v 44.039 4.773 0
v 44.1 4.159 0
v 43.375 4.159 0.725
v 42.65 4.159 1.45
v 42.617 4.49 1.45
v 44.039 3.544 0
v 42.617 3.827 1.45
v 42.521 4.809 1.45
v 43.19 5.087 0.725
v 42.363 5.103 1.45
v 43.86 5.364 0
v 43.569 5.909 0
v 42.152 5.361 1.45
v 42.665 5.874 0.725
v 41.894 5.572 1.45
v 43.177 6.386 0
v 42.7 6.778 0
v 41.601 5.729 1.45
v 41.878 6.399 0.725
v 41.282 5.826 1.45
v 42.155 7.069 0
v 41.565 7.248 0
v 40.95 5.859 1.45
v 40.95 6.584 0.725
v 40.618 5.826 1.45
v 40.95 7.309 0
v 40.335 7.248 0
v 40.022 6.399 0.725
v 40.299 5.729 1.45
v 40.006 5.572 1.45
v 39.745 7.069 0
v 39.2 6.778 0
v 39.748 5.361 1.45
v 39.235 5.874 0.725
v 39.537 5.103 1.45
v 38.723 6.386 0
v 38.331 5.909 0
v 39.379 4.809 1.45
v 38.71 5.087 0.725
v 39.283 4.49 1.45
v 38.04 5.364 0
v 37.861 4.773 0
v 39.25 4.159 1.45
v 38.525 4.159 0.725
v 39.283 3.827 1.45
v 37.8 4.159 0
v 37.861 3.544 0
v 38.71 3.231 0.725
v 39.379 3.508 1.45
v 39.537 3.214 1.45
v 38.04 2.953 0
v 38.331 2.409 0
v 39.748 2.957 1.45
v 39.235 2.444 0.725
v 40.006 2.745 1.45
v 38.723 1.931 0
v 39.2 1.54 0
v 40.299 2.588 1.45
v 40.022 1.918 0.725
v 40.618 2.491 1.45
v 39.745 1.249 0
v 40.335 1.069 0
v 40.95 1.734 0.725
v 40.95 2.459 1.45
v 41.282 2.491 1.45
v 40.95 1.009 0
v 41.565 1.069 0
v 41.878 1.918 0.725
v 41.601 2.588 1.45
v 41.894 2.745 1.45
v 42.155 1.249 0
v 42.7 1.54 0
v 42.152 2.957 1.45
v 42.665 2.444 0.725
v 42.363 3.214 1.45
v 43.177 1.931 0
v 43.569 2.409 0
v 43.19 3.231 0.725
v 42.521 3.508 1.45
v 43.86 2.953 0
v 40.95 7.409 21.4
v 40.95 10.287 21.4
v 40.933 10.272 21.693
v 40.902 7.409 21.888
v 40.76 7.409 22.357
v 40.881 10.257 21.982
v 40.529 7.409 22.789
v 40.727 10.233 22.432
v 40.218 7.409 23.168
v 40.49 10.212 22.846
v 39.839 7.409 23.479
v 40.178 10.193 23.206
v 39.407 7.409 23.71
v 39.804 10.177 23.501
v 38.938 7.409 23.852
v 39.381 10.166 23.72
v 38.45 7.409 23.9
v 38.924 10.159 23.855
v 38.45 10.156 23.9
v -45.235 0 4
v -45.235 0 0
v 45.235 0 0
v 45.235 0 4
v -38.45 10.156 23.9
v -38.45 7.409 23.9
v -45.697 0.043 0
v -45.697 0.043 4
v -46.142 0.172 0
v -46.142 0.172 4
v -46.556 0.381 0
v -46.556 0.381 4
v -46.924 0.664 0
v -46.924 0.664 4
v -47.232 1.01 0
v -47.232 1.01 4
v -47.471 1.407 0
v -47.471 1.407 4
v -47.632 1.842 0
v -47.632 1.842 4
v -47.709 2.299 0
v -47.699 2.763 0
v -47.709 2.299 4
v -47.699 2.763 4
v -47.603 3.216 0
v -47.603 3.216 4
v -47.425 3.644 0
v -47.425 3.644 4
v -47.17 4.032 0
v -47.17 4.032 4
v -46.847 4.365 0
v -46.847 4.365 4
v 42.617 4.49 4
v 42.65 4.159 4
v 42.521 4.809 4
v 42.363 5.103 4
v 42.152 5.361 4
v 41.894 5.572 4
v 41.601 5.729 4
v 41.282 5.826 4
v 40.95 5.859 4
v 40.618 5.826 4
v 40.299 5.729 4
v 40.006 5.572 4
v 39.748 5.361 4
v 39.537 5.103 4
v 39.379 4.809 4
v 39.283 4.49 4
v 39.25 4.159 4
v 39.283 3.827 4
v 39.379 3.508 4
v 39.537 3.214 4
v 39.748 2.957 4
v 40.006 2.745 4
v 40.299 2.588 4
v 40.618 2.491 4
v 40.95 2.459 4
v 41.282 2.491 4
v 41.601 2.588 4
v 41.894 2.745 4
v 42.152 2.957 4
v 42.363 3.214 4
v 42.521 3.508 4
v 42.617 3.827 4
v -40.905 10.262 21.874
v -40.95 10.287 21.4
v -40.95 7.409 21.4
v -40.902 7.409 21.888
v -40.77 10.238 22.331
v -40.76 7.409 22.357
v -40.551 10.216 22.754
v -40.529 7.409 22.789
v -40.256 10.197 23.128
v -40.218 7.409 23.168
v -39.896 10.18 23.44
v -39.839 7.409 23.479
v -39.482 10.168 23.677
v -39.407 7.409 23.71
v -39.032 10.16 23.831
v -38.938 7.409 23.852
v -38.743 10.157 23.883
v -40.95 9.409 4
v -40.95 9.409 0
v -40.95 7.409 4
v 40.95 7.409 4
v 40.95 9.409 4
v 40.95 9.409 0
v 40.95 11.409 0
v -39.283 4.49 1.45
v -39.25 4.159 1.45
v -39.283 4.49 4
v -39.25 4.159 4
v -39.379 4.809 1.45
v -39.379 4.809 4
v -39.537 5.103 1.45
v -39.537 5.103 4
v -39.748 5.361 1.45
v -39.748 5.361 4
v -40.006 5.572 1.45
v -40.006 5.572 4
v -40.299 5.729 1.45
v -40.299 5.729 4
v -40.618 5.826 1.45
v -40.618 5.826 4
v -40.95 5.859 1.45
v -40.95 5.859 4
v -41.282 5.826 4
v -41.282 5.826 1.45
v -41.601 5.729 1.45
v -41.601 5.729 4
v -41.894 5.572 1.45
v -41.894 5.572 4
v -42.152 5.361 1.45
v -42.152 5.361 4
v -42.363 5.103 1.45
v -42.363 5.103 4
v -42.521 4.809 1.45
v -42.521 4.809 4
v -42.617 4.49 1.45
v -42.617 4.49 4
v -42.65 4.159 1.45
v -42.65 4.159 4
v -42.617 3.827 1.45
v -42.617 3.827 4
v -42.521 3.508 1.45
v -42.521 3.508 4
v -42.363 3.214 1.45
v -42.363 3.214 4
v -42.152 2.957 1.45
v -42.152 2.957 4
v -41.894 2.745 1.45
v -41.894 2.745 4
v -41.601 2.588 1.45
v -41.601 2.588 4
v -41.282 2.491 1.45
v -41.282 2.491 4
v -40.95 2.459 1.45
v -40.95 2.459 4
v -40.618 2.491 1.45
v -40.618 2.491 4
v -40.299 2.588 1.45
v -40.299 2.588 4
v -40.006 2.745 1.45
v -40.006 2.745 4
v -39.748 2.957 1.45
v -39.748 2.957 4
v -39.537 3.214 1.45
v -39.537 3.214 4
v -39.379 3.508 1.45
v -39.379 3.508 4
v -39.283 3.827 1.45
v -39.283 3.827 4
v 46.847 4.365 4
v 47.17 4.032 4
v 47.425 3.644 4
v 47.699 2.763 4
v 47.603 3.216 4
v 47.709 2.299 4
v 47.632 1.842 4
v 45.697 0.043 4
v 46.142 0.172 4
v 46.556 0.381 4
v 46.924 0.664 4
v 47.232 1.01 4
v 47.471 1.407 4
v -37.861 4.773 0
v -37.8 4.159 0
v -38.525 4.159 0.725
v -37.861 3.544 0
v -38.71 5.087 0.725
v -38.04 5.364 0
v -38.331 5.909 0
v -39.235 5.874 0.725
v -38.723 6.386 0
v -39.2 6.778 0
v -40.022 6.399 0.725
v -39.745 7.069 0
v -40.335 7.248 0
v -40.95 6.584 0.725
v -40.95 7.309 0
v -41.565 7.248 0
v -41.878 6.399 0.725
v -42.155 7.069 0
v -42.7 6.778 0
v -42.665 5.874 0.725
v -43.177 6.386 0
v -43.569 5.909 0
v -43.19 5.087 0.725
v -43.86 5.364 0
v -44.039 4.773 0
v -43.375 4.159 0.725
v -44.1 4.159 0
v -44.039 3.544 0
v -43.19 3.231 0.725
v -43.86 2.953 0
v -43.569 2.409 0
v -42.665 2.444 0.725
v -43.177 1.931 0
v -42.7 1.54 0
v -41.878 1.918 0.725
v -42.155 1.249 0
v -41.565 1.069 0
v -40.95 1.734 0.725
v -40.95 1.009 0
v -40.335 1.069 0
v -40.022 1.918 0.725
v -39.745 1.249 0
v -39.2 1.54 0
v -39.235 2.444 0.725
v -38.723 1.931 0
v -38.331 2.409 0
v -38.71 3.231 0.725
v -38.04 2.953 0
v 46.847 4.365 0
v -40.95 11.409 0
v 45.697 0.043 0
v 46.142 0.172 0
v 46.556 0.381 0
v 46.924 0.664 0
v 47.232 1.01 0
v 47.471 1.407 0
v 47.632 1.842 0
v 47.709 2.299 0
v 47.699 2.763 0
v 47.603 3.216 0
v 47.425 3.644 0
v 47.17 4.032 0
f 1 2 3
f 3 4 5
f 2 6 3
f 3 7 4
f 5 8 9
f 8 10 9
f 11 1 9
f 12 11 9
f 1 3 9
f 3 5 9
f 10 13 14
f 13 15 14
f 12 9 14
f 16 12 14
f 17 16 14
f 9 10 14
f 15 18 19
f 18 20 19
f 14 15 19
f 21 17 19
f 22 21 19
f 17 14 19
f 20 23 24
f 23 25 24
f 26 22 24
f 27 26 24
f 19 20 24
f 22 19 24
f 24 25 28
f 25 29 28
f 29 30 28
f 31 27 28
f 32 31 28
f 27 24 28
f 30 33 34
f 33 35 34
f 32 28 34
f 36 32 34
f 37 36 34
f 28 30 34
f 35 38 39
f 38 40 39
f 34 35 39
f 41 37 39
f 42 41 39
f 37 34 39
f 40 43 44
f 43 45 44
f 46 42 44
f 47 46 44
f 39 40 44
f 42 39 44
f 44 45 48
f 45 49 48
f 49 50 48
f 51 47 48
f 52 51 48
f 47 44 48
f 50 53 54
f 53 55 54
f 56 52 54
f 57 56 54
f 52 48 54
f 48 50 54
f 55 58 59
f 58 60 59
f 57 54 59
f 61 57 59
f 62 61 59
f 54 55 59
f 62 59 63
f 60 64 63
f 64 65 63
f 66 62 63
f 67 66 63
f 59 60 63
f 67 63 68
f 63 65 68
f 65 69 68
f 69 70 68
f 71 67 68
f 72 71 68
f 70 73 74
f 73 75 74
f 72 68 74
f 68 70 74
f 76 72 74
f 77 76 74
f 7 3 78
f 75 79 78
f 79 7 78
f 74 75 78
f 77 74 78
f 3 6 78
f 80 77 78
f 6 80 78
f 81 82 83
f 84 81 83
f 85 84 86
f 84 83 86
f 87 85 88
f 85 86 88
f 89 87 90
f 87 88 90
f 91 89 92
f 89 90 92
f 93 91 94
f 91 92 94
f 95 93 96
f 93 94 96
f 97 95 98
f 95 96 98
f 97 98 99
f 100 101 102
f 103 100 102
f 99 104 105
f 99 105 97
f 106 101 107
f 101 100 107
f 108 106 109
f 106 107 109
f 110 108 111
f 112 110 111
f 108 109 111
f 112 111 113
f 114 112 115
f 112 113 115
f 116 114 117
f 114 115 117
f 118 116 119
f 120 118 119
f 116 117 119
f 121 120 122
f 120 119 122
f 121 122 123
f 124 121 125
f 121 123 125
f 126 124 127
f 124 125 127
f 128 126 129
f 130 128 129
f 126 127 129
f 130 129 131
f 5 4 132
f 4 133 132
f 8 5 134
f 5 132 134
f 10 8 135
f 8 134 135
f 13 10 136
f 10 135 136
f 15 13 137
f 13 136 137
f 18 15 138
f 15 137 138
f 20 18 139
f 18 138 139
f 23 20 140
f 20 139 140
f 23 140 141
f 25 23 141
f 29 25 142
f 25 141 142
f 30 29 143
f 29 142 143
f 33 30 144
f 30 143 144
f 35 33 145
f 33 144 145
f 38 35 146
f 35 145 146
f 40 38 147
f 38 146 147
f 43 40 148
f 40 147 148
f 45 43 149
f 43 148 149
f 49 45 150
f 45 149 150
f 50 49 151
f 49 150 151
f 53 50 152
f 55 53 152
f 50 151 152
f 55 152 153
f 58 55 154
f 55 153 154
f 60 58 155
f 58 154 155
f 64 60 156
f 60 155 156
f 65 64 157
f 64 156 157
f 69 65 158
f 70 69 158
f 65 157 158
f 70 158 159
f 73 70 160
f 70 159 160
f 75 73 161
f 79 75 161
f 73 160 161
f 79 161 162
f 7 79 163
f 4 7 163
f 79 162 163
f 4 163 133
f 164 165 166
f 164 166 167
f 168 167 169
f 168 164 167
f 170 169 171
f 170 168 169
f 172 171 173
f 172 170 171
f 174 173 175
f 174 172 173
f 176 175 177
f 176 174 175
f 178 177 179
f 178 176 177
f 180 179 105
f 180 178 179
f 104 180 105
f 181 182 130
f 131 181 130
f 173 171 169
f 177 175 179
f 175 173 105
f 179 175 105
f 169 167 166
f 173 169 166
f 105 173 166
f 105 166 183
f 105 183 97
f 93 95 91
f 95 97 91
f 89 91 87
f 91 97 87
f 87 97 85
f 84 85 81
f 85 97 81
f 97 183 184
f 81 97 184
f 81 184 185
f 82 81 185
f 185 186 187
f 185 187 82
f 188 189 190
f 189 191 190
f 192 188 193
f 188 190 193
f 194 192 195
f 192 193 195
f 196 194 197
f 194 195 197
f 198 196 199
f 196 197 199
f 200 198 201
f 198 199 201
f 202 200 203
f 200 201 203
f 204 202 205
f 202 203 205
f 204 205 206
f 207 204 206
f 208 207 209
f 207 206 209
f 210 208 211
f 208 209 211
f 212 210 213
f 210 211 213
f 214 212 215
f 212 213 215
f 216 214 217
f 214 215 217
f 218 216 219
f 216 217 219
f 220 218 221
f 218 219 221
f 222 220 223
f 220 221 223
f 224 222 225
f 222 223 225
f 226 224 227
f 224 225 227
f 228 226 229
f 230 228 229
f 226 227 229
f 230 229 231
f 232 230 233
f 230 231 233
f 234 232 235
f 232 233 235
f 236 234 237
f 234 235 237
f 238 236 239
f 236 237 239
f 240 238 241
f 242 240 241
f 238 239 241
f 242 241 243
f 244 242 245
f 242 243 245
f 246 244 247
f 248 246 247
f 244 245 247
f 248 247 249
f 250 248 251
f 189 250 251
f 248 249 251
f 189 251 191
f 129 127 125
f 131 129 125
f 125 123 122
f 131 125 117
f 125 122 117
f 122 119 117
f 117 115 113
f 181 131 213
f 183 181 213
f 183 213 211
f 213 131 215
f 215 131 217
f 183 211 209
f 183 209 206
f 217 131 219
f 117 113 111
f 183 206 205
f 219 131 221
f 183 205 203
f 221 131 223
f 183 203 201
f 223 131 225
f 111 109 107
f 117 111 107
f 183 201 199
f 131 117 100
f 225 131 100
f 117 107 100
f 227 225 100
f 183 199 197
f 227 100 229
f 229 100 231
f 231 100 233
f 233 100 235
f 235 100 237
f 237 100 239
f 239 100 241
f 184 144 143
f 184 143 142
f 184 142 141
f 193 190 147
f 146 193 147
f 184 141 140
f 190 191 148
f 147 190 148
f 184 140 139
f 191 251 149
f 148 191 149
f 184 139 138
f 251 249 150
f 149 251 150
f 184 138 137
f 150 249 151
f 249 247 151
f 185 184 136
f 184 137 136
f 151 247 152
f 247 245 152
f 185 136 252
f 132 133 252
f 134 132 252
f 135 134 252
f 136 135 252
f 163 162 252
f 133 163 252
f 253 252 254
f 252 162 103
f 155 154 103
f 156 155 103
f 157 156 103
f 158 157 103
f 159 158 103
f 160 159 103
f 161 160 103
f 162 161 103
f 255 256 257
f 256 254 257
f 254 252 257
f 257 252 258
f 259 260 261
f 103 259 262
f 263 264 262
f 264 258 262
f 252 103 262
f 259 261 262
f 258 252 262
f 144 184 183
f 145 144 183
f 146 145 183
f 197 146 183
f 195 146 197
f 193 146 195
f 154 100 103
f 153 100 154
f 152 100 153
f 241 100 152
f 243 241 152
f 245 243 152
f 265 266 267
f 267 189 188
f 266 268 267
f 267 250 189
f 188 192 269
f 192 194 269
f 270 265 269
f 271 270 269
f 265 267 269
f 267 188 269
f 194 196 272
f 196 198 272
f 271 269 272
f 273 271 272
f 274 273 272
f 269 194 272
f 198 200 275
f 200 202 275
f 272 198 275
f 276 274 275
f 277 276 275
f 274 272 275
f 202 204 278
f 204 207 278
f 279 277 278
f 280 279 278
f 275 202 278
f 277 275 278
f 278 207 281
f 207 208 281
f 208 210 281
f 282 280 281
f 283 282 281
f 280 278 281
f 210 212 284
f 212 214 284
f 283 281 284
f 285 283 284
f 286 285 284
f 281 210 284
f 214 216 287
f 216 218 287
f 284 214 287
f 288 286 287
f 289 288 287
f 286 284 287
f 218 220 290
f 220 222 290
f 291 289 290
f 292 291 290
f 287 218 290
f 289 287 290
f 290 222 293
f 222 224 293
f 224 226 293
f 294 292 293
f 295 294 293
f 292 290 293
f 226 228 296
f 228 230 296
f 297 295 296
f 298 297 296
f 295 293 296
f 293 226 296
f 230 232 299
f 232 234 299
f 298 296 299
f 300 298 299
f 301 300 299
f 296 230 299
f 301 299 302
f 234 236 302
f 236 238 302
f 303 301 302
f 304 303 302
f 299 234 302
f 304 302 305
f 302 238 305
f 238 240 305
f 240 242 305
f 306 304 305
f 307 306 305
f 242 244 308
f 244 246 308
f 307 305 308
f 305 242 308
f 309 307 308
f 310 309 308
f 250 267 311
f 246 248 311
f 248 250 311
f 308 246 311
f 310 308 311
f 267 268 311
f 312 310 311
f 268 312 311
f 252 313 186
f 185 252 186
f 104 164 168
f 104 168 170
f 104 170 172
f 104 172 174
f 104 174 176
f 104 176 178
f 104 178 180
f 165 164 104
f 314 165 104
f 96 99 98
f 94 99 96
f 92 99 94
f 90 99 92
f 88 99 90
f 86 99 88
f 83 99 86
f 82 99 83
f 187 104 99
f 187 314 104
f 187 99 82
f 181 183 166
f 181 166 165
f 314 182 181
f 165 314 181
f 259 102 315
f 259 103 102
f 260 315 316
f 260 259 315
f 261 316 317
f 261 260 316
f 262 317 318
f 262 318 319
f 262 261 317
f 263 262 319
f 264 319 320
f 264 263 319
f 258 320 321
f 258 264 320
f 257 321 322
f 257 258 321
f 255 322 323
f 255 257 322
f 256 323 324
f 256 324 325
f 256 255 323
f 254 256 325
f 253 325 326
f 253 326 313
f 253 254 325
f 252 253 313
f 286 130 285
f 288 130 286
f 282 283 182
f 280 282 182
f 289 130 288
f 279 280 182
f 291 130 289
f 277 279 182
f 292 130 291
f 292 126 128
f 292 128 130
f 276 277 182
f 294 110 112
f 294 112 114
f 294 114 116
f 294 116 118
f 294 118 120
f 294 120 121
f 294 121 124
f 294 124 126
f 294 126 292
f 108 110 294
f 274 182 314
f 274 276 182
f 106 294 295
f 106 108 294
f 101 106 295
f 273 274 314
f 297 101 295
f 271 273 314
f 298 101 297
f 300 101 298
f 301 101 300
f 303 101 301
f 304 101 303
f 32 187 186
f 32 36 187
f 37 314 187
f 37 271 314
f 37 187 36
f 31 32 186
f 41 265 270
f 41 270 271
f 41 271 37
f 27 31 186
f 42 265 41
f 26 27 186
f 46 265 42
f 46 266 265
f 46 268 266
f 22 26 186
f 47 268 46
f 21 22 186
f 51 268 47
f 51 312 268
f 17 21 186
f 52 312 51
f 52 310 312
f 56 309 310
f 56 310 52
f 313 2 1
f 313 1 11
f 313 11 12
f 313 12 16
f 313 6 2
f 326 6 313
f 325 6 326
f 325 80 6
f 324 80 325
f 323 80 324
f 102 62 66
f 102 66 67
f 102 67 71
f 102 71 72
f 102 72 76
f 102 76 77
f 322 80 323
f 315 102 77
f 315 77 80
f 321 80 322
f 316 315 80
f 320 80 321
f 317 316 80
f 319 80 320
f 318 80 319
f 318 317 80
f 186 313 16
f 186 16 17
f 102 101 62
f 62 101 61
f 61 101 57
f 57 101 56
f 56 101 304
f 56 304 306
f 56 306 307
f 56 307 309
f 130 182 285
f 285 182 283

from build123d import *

# Parameters (mm, degrees)
BOSS_EXTRUDE1_DEPTH                             = 4
FILLET1_R                                       = 2.48
SKETCH4_W                                       = 81.9
SKETCH4_H                                       = 4
BOSS_EXTRUDE3_DEPTH                             = 2
SKETCH6_W                                       = 81.9
SKETCH6_H                                       = 4
BOSS_EXTRUDE4_DEPTH                             = 19.9
FILLET3_R                                       = 2.5
SKETCH7_W                                       = 81.9
SKETCH7_H                                       = 35.801674527
CUT_REVOLVE2_ANGLE                              = 3
CSK_FOR_M3_FLAT_HEAD_MACHINE_SCREW1_D           = 3.4
CSK_FOR_M3_FLAT_HEAD_MACHINE_SCREW1_DEPTH       = 10.1
CSK_FOR_M3_FLAT_HEAD_MACHINE_SCREW1_CSINK_D     = 6.3
CSK_FOR_M3_FLAT_HEAD_MACHINE_SCREW1_CSINK_ANGLE = 90
CSK_FOR_M3_FLAT_HEAD_MACHINE_SCREW1_TIP         = 1.021463052


with BuildPart() as part:
    # Sketch1 → Boss-Extrude1 (new body)
    with BuildSketch(Plane.XY):
        Polygon((-51.95, 0), (51.95, 0), (40.95, 9.408805716), (-40.95, 9.408805716), align=None)
    extrude(amount=BOSS_EXTRUDE1_DEPTH)

    # Fillet1
    fillet1_edges = [part.edges().sort_by_distance(p)[0] for p in [
        (51.95, 0, 2),
        (-51.95, 0, 2),
    ]]
    fillet(fillet1_edges, radius=FILLET1_R)

    # Sketch4 → Boss-Extrude3 (add)
    with BuildSketch(Plane(origin=(0, 9.408805716, 0), x_dir=(1, 0, 0), z_dir=(0, 1, 0))):
        with Locations((0, -2)):
            Rectangle(SKETCH4_W, SKETCH4_H)
    extrude(amount=BOSS_EXTRUDE3_DEPTH)

    # Sketch6 → Boss-Extrude4 (add)
    with BuildSketch(Plane.XY.offset(4)):
        with Locations((0, 9.408805716)):
            Rectangle(SKETCH6_W, SKETCH6_H)
    extrude(amount=BOSS_EXTRUDE4_DEPTH)

    # Fillet3
    fillet3_edges = [part.edges().sort_by_distance(p)[0] for p in [
        (-40.95, 9.408805716, 23.9),
        (40.95, 9.408805716, 23.9),
    ]]
    fillet(fillet3_edges, radius=FILLET3_R)

    # Sketch7 → Cut-Revolve2 (revolve, cut)
    with BuildSketch(Plane(origin=(0, 11.408805716, 0), x_dir=(1, 0, 0), z_dir=(0, 1, 0))):
        with Locations((0, -17.900837264)):
            Rectangle(SKETCH7_W, SKETCH7_H)
    revolve(axis=Axis((-40.95, 11.408805716, 0), (1, 0, 0)), revolution_arc=CUT_REVOLVE2_ANGLE, mode=Mode.SUBTRACT)

    # CSK for M3 Flat Head Machine Screw1
    with Locations(Plane(origin=(0, 0, 0), x_dir=(-1, 0, 0), z_dir=(0, 0, -1))):
        with Locations((-40.95, 4.158805716), (40.95, 4.158805716)):
            CounterSinkHole(CSK_FOR_M3_FLAT_HEAD_MACHINE_SCREW1_D / 2, CSK_FOR_M3_FLAT_HEAD_MACHINE_SCREW1_CSINK_D / 2, depth=CSK_FOR_M3_FLAT_HEAD_MACHINE_SCREW1_DEPTH, counter_sink_angle=CSK_FOR_M3_FLAT_HEAD_MACHINE_SCREW1_CSINK_ANGLE)
            with Locations((0, 0, -(CSK_FOR_M3_FLAT_HEAD_MACHINE_SCREW1_DEPTH + CSK_FOR_M3_FLAT_HEAD_MACHINE_SCREW1_TIP / 2))):  # 118° drill point
                Cone(0, CSK_FOR_M3_FLAT_HEAD_MACHINE_SCREW1_D / 2, CSK_FOR_M3_FLAT_HEAD_MACHINE_SCREW1_TIP, mode=Mode.SUBTRACT)


solid = part.part
